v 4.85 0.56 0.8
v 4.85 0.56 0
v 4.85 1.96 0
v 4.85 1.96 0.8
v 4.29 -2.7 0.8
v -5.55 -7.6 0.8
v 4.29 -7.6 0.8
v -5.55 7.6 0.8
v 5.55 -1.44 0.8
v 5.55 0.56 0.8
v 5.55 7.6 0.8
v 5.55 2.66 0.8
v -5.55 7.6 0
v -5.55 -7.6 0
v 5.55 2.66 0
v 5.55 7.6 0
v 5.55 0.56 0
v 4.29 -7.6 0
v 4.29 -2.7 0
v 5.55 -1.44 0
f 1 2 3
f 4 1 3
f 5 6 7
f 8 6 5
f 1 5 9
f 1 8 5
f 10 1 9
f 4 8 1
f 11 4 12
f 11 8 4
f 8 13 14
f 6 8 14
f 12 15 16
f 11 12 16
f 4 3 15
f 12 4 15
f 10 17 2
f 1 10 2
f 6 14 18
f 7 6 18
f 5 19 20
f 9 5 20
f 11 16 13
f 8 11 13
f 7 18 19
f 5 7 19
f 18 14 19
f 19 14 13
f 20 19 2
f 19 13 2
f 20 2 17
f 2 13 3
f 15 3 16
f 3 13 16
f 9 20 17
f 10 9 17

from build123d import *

# Parameters (mm, degrees)
CROQUIS1_W              = 9.84
CROQUIS1_H              = 4.9
SALIENTE_EXTRUIR1_DEPTH = 0.8


with BuildPart() as part:
    # Croquis1 → Saliente-Extruir1 (new body)
    with BuildSketch(Plane.XY):
        Polygon((-5.55, -2.7), (4.29, -2.7), (5.55, -1.44), (5.55, 0.56), (4.85, 0.56), (4.85, 1.96), (5.55, 2.66), (5.55, 7.6), (-5.55, 7.6), align=None)
        with Locations((-0.63, -5.15)):
            Rectangle(CROQUIS1_W, CROQUIS1_H)
    extrude(amount=SALIENTE_EXTRUIR1_DEPTH)


solid = part.part
